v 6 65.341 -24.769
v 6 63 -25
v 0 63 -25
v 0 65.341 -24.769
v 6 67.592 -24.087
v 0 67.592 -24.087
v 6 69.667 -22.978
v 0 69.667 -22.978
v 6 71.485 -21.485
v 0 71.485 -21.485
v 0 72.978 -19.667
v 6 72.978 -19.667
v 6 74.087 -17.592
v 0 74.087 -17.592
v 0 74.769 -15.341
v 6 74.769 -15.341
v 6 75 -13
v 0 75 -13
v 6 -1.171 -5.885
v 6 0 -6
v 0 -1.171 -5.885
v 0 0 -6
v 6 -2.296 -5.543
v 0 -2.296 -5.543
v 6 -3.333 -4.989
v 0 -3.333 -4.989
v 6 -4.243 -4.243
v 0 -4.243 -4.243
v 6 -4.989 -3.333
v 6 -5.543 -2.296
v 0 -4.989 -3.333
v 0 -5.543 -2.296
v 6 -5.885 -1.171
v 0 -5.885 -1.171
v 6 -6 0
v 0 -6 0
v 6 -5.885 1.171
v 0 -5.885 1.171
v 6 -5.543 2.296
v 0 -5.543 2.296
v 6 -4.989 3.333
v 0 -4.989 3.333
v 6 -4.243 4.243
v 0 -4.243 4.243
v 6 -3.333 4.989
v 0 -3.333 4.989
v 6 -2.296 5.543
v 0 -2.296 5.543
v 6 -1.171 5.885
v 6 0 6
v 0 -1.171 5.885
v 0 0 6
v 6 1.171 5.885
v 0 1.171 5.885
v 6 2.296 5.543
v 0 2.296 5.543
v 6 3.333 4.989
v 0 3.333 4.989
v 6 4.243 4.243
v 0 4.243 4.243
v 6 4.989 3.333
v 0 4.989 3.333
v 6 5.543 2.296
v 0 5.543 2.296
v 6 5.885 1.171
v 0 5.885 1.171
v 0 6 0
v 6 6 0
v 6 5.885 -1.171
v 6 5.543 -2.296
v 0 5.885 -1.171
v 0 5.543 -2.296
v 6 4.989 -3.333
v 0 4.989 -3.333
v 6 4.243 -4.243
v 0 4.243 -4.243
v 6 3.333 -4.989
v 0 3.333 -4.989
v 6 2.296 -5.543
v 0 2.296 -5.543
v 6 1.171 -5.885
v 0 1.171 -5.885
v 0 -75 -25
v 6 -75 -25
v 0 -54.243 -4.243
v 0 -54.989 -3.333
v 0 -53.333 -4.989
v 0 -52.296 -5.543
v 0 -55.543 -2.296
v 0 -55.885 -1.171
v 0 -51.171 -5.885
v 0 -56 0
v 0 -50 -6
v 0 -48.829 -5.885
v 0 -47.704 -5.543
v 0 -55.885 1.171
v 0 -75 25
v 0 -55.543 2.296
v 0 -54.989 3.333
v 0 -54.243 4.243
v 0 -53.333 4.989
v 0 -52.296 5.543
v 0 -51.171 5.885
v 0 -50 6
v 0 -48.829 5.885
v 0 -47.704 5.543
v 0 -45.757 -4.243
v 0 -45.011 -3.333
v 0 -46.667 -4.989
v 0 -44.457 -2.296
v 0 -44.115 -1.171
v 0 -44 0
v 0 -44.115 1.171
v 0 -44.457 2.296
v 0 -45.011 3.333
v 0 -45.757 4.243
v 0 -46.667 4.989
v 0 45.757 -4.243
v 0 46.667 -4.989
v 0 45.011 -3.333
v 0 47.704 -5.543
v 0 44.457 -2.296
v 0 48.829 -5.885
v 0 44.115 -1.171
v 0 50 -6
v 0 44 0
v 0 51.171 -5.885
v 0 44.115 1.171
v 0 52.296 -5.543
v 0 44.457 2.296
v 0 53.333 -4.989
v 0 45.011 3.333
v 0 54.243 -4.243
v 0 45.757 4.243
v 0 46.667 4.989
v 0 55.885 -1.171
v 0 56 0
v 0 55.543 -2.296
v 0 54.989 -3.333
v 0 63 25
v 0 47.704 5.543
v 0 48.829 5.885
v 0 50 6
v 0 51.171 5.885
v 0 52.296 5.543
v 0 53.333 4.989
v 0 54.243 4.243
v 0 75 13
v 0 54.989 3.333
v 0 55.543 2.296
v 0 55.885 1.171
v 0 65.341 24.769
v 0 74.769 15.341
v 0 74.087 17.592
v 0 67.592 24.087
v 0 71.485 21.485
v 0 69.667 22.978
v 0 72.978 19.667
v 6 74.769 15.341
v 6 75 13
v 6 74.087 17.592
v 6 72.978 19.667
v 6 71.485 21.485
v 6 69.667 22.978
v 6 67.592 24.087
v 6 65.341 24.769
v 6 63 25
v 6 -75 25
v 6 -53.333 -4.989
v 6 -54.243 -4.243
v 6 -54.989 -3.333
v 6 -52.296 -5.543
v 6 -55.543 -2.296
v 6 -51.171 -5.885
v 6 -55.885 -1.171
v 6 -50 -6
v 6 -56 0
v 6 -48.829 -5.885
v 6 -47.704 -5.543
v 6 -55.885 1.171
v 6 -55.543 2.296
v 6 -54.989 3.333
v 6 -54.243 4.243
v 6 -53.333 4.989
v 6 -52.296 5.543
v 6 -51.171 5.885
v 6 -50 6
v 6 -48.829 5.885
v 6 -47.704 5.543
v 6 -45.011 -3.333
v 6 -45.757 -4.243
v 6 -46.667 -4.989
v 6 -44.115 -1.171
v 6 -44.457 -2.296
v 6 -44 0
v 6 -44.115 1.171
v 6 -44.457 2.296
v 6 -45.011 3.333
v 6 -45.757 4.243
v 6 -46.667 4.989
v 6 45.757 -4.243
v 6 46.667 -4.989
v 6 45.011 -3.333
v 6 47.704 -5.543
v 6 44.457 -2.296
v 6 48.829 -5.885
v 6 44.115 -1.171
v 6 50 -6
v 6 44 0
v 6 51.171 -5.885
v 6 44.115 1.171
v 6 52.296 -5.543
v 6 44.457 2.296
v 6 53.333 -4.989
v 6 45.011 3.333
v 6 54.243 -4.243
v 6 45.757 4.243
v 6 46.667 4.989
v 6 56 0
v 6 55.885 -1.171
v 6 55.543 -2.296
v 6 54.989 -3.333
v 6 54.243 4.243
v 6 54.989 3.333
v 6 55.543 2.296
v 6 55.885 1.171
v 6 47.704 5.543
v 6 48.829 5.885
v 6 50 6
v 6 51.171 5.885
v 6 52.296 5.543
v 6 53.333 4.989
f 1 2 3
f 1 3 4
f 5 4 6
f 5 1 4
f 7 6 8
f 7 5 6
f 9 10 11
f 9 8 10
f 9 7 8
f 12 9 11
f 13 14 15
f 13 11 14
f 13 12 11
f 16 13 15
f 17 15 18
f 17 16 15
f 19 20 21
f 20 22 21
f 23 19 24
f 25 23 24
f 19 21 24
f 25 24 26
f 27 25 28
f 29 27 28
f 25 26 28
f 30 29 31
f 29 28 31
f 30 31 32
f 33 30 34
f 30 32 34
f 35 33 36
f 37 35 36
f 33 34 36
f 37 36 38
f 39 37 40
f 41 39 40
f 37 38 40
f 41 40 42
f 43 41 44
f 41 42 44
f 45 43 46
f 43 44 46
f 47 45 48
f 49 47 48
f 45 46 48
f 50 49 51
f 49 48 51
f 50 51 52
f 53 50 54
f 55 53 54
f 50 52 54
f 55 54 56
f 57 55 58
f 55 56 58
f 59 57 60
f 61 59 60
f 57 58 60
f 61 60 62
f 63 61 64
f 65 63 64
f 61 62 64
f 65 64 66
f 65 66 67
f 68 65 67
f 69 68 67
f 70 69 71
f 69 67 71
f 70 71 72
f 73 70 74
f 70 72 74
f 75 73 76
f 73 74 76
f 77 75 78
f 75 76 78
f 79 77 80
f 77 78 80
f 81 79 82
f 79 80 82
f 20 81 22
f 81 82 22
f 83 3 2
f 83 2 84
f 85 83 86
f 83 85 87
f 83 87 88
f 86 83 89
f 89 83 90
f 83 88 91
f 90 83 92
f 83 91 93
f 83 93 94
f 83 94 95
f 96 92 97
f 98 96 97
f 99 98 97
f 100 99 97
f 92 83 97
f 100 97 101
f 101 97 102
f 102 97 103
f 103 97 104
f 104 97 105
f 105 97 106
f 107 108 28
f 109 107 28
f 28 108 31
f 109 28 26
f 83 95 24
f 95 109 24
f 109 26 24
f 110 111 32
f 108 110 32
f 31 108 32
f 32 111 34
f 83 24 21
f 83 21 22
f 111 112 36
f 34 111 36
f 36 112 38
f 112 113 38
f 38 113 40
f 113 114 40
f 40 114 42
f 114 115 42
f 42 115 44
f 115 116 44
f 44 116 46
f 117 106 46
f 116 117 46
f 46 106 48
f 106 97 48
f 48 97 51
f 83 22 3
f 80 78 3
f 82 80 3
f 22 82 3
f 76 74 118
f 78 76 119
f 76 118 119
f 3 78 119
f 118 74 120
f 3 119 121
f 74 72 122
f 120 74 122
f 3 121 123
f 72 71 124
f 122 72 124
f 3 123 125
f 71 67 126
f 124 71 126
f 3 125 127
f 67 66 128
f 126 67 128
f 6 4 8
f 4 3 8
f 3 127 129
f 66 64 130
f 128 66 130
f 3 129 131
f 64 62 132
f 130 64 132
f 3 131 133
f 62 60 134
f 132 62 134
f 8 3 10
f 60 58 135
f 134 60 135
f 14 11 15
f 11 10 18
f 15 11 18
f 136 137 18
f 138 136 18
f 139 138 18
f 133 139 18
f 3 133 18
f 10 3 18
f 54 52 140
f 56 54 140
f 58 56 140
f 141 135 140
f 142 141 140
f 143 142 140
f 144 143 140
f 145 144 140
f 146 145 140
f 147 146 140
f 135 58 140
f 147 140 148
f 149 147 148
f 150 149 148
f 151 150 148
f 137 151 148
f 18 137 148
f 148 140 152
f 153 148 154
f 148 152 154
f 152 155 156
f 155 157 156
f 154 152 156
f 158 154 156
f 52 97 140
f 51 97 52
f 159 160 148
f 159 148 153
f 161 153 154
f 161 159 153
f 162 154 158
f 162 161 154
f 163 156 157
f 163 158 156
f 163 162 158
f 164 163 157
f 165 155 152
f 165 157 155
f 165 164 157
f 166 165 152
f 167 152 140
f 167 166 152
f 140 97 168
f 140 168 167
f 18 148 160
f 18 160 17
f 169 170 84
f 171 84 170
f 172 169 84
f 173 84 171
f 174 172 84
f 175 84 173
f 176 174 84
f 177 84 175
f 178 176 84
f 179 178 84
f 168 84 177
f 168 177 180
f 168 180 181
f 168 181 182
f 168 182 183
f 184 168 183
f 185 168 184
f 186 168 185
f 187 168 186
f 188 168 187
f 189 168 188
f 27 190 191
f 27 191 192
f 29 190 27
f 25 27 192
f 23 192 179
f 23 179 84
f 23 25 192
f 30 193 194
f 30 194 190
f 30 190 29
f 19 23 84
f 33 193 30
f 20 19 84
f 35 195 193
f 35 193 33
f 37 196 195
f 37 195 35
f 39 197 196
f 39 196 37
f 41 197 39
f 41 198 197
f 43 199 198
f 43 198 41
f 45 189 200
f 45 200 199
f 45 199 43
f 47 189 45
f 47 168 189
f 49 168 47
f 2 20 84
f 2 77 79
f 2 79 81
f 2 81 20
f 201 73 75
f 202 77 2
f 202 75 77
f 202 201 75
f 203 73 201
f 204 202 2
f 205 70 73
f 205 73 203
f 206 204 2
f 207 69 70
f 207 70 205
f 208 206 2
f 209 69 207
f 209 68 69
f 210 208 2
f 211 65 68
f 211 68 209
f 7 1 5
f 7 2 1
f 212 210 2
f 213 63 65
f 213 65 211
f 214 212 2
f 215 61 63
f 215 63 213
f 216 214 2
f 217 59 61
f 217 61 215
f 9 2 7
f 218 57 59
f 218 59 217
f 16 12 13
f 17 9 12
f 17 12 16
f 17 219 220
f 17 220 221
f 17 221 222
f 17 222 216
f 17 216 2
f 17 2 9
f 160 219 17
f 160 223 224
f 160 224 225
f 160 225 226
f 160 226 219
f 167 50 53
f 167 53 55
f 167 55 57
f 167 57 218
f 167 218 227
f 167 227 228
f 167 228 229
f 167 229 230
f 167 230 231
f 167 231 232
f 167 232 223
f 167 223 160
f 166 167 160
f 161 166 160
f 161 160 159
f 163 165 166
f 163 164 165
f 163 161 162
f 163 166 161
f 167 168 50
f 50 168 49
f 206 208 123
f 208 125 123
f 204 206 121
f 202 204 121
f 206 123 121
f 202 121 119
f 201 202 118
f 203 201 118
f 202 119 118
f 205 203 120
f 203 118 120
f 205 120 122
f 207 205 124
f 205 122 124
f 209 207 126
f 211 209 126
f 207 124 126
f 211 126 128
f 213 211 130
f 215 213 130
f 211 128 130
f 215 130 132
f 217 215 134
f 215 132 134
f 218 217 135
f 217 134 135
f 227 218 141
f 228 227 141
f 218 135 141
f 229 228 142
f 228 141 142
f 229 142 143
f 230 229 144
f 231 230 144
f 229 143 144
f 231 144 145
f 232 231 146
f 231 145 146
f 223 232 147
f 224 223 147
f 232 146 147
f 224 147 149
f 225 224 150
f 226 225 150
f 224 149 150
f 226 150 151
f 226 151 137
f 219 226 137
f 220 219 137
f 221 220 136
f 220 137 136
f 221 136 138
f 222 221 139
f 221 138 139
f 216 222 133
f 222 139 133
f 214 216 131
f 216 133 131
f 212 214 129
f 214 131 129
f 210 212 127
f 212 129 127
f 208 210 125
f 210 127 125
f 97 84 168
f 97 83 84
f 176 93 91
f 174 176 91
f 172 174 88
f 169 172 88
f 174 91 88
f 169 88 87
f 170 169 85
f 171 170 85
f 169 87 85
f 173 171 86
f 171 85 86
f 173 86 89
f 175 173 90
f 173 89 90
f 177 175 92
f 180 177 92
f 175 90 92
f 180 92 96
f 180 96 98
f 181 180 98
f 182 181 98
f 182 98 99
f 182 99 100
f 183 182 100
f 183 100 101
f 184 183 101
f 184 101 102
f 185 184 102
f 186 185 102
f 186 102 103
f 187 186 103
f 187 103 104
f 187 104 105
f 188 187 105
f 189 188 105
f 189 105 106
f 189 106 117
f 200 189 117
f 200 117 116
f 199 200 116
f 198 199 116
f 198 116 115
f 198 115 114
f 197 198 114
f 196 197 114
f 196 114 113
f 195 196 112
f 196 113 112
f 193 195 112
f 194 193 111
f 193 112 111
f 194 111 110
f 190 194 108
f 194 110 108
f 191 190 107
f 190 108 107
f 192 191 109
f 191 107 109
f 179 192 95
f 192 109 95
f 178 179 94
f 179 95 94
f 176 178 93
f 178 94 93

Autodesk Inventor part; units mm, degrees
ref_plane "YZ Plane" through (0, 0, 0) normal (1, 0, 0) x (0, 1, 0)
ref_plane "XZ Plane" through (0, 0, 0) normal (0, 1, 0) x (-1, 0, 0)
ref_plane "XY Plane" through (0, 0, 0) normal (0, 0, 1) x (1, 0, 0)
sketch "Sketch1" plane through (0, 0, 0) normal (1, 0, 0) x (0, 1, 0)
  line L0 (-75, 25) -> (75, 25)
  line L1 (75, 25) -> (75, -25)
  line L2 (75, -25) -> (-75, -25)
  line L3 (-75, -25) -> (-75, 25)
  point P0 (0, 0)
  dimension "d0" = 150
  dimension "d1" = 50
  dimension "d2" = 25
  dimension "d3" = 75
extrude "Extrusion1" add sketch "Sketch1" along normal blind 6
sketch "Sketch2" plane through (6, 0, 0) normal (1, 0, 0) x (0, 0, -1)
  point P0 (0, 0)
  point P1 (0, 0)
  point P2 (0, 50)
  point P3 (0, -50)
  dimension "d15" = 50
  dimension "d16" = 50
hole "Hole2" at (6, 0, 0) at (6, 50, 0) at (6, -50, 0) direction (-1, 0, 0) diameter 12 end through all
fillet "Fillet3" radius 12 2 edges at (3, 75, 25) (3, 75, -25)
equation "\"d0\" = 3 * hoop_tabs_width"
equation "\"d1\" = hoop_tabs_width"
equation "\"d2\" = 0.5 * d1"
equation "\"d3\" = 0.5 * d0"
equation "\"d4\" = hoop_tabs_thickness"
equation "\"d15\" = hoop_tabs_width"
equation "\"d16\" = hoop_tabs_width"
equation "\"d17\" = hoop_tabs_hole"
equation "\"d24\" = hoop_tabs_hole"
equation "\"hoop_tabs_width\" = 50"
equation "\"hoop_tabs_thickness\" = 6"
equation "\"hoop_tabs_hole\" = 12"
equation "\"hoop_angle_z\" = 45deg"
equation "\"hoop_bearing_length\" = 5deg"
equation "\"hoop_cable_diam\" = 5"
equation "\"hoop_cable_pulley_diam\" = 22"
equation "\"hoop_thickness_large\" = 4"
equation "\"hoop_thickness_medium\" = 3.2"
equation "\"hoop_thickness_small\" = 2"
equation "\"hoop_width_large\" = 51"
equation "\"hoop_width_medium\" = 33.7"
equation "\"hoop_width_small\" = 25.4"
equation "\"rack_tooth_addendum\" = 5"
equation "\"rack_tooth_dedendum\" = 5"
equation "\"rack_tooth_thickness\" = 5"
equation "\"secure_arm_angle\" = 35deg"
equation "\"secure_arm_radii\" = 9"
equation "\"support_baseClamp_platformLengthBuffer\" = 35"
equation "\"support_baseClamp_platformThickness\" = 15"
equation "\"support_baseClamp_platformWidthBuffer\" = 0"
equation "\"support_baseClamp_sleeveHoleDiameter\" = 12"
equation "\"support_baseClamp_sleeveSweepTerminationAngle\" = 55deg"
equation "\"support_baseClamp_thickness\" = 8"
equation "\"support_frame_endHoleBuffer\" = 45"
equation "\"support_frame_squareBarFillet\" = 2"
equation "\"support_frame_squareBarThickness\" = 5"
equation "\"wheelchair_deployed_width\" = 635"
equation "\"wheelchair_deployed_length\" = 1067"
equation "\"wheelchair_deployed_height\" = 914"
equation "\"sm_varx_squareBarThickness\" = 2.5"
equation "\"sm_varx_pinPlate_thickness\" = 5"
equation "\"sm_varx_pinPlate_holeDiameter\" = 5"
equation "\"sm_varx_member_tolerance\" = 0"
equation "\"hoop_bushing23_radialInterference\" = 0"
equation "\"hoop_bushing12_radialInterference\" = 0"
equation "\"hoop_bushing23_od\" = -2 * hoop_thickness_medium + hoop_width_medium + hoop_bushing23_radialInterference"
equation "\"hoop_bushing12_od\" = -2 * hoop_thickness_large + hoop_width_large + hoop_bushing12_radialInterference"
equation "\"wheelchatir_pos_deploy_angle_0\" = 65deg"
equation "\"wheelchatir_pos_store_angle_0\" = 90deg"
equation "\"wheelchatir_pos_deploy_angle_1\" = 20deg"
equation "\"wheelchatir_pos_store_angle_1\" = 20deg"
equation "\"hoop_bushing12_thickness\" = -hoop_width_medium + hoop_bushing12_od - 2 * hoop_bushing12_radialInterference"
equation "\"hoop_bushing23_thickness\" = -hoop_width_small + hoop_bushing23_od - 2 * hoop_bushing23_radialInterference"
properties part number "hoop_tab" material "Steel, Mild"
